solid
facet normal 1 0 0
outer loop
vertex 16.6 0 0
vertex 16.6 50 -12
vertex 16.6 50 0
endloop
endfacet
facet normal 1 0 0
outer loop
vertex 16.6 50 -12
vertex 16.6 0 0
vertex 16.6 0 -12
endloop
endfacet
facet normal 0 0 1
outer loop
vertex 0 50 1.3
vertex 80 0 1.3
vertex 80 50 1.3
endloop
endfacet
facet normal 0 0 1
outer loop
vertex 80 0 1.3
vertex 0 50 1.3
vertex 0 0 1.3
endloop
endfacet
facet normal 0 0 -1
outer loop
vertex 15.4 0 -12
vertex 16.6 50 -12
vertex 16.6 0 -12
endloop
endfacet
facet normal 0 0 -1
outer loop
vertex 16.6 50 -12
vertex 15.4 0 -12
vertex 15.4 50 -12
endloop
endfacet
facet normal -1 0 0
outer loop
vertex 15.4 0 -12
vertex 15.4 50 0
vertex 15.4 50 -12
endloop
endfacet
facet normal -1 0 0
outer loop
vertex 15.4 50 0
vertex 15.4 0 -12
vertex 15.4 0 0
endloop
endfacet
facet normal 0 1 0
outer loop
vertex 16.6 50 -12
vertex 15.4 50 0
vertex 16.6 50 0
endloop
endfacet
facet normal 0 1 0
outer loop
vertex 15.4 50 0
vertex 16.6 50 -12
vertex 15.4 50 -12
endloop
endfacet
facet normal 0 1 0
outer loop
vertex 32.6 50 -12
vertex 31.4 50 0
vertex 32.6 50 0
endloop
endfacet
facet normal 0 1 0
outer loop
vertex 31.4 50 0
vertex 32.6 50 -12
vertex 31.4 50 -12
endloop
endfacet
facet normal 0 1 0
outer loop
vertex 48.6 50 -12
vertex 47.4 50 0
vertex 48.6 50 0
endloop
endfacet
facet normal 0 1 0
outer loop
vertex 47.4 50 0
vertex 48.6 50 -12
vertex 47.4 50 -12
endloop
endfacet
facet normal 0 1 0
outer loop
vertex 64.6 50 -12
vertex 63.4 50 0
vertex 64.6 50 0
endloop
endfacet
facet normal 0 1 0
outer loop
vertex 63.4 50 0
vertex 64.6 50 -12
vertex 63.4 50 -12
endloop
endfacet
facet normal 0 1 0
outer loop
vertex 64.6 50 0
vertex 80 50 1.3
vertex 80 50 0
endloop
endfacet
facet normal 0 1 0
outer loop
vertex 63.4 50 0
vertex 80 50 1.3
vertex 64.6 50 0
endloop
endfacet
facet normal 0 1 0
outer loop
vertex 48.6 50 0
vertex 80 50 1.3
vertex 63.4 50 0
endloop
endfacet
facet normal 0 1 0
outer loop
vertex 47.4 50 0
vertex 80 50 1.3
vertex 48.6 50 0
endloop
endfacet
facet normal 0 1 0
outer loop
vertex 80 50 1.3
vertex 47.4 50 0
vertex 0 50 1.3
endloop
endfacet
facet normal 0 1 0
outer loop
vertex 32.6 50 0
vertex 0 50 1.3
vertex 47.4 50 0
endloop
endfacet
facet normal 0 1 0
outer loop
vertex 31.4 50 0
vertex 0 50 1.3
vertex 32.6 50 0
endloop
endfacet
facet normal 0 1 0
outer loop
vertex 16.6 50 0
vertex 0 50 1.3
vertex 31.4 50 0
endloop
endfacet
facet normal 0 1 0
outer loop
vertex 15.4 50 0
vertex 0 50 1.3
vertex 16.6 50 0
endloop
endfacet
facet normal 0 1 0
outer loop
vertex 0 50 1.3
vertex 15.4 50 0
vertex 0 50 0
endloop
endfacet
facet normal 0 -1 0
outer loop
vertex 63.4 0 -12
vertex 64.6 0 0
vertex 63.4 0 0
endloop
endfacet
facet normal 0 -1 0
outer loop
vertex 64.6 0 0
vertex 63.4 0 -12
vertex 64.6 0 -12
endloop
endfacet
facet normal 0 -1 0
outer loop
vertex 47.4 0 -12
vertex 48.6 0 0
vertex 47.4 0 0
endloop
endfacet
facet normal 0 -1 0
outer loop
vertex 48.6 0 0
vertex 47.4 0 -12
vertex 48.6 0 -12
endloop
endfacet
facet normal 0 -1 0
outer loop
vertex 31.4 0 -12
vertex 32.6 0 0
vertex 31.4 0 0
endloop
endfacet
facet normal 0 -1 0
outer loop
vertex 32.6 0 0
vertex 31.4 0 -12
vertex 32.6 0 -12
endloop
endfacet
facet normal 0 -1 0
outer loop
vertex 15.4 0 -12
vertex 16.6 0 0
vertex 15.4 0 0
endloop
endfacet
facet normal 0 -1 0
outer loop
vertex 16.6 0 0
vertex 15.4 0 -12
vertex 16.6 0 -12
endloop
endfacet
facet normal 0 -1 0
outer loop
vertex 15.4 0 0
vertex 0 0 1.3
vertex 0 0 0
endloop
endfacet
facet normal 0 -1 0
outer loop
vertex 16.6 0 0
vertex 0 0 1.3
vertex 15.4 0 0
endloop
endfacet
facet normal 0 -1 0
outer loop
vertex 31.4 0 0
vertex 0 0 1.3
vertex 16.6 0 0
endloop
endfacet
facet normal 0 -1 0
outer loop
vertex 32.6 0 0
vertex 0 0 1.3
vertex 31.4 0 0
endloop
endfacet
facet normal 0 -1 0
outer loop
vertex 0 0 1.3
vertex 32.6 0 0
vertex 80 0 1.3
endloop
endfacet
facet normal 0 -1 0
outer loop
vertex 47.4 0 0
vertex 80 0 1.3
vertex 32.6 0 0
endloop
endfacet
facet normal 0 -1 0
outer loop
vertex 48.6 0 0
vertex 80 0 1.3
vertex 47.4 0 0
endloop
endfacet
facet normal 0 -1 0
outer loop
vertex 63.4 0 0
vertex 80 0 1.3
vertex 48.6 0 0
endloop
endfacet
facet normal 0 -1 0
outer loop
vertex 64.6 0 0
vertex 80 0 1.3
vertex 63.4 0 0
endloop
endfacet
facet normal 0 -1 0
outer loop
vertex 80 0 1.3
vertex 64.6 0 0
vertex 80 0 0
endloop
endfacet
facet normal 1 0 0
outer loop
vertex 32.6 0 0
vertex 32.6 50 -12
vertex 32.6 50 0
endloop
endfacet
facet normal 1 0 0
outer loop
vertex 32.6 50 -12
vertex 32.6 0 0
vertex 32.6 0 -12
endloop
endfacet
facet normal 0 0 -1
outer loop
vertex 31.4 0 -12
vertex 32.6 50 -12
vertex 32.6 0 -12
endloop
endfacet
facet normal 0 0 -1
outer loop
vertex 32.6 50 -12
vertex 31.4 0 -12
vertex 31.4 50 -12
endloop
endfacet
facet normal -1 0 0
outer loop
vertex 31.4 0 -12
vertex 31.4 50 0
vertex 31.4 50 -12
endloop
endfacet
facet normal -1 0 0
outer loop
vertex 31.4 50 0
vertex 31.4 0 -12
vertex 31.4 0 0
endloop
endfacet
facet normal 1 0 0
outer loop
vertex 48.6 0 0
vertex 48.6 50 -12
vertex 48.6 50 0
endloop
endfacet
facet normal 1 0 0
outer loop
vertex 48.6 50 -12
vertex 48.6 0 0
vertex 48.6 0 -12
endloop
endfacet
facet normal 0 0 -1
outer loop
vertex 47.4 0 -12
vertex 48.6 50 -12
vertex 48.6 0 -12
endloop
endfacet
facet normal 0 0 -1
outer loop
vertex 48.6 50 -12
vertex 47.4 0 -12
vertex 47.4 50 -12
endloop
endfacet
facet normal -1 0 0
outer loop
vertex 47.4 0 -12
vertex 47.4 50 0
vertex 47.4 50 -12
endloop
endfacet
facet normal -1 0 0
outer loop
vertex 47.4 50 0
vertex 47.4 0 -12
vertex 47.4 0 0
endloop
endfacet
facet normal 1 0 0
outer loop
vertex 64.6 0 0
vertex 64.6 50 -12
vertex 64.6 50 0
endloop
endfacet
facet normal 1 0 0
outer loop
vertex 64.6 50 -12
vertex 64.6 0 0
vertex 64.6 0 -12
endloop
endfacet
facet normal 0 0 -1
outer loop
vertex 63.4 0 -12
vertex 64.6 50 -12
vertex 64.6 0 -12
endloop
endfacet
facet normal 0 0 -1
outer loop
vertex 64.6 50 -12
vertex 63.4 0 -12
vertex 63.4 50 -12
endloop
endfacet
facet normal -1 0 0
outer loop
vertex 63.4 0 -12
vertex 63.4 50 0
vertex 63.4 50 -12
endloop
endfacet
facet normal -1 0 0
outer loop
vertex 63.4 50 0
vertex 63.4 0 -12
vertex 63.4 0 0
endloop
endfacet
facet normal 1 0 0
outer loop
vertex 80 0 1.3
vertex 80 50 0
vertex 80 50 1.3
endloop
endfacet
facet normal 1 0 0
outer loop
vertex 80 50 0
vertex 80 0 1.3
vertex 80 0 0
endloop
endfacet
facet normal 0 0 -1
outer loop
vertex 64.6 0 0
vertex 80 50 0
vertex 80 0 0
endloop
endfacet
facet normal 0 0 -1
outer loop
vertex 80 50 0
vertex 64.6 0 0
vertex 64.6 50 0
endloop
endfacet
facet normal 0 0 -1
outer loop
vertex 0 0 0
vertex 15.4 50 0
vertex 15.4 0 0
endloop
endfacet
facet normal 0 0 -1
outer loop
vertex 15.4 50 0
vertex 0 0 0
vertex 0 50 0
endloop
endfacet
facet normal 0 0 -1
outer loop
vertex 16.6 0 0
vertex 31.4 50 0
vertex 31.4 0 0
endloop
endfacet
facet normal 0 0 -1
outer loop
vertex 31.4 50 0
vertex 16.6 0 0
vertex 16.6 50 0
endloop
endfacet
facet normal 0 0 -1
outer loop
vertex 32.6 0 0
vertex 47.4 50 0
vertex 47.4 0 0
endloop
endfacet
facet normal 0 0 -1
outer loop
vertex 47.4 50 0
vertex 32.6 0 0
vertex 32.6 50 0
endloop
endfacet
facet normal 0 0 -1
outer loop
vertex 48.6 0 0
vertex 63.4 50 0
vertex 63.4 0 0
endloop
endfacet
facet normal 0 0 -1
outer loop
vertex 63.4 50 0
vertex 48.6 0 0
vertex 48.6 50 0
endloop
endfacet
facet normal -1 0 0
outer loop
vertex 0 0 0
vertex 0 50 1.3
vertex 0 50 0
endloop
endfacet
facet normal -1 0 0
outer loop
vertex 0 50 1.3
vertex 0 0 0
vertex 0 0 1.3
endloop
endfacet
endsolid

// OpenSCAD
$fn = 32;

// ----------------------------------------------------------------------
// Ribbed panel: 1.3 mm panel
// ----------------------------------------------------------------------

// --- parameters (mm) ---
panel_l = 80;             // panel length, X
panel_w = 50;             // panel width, Y
panel_t = 1.3;            // panel thickness, Z
rib_t = 1.2;              // rib thickness
rib_h = 12;               // rib height below the panel
ribs = 4;                 // number of ribs

total_h = panel_t + rib_h;  // overall height

union() {
  cube([panel_l, panel_w, panel_t]);
  for (i = [1 : ribs])
    translate([i * panel_l / (ribs + 1) - rib_t / 2, 0, -rib_h])
      cube([rib_t, panel_w, rib_h + panel_t]);
}
